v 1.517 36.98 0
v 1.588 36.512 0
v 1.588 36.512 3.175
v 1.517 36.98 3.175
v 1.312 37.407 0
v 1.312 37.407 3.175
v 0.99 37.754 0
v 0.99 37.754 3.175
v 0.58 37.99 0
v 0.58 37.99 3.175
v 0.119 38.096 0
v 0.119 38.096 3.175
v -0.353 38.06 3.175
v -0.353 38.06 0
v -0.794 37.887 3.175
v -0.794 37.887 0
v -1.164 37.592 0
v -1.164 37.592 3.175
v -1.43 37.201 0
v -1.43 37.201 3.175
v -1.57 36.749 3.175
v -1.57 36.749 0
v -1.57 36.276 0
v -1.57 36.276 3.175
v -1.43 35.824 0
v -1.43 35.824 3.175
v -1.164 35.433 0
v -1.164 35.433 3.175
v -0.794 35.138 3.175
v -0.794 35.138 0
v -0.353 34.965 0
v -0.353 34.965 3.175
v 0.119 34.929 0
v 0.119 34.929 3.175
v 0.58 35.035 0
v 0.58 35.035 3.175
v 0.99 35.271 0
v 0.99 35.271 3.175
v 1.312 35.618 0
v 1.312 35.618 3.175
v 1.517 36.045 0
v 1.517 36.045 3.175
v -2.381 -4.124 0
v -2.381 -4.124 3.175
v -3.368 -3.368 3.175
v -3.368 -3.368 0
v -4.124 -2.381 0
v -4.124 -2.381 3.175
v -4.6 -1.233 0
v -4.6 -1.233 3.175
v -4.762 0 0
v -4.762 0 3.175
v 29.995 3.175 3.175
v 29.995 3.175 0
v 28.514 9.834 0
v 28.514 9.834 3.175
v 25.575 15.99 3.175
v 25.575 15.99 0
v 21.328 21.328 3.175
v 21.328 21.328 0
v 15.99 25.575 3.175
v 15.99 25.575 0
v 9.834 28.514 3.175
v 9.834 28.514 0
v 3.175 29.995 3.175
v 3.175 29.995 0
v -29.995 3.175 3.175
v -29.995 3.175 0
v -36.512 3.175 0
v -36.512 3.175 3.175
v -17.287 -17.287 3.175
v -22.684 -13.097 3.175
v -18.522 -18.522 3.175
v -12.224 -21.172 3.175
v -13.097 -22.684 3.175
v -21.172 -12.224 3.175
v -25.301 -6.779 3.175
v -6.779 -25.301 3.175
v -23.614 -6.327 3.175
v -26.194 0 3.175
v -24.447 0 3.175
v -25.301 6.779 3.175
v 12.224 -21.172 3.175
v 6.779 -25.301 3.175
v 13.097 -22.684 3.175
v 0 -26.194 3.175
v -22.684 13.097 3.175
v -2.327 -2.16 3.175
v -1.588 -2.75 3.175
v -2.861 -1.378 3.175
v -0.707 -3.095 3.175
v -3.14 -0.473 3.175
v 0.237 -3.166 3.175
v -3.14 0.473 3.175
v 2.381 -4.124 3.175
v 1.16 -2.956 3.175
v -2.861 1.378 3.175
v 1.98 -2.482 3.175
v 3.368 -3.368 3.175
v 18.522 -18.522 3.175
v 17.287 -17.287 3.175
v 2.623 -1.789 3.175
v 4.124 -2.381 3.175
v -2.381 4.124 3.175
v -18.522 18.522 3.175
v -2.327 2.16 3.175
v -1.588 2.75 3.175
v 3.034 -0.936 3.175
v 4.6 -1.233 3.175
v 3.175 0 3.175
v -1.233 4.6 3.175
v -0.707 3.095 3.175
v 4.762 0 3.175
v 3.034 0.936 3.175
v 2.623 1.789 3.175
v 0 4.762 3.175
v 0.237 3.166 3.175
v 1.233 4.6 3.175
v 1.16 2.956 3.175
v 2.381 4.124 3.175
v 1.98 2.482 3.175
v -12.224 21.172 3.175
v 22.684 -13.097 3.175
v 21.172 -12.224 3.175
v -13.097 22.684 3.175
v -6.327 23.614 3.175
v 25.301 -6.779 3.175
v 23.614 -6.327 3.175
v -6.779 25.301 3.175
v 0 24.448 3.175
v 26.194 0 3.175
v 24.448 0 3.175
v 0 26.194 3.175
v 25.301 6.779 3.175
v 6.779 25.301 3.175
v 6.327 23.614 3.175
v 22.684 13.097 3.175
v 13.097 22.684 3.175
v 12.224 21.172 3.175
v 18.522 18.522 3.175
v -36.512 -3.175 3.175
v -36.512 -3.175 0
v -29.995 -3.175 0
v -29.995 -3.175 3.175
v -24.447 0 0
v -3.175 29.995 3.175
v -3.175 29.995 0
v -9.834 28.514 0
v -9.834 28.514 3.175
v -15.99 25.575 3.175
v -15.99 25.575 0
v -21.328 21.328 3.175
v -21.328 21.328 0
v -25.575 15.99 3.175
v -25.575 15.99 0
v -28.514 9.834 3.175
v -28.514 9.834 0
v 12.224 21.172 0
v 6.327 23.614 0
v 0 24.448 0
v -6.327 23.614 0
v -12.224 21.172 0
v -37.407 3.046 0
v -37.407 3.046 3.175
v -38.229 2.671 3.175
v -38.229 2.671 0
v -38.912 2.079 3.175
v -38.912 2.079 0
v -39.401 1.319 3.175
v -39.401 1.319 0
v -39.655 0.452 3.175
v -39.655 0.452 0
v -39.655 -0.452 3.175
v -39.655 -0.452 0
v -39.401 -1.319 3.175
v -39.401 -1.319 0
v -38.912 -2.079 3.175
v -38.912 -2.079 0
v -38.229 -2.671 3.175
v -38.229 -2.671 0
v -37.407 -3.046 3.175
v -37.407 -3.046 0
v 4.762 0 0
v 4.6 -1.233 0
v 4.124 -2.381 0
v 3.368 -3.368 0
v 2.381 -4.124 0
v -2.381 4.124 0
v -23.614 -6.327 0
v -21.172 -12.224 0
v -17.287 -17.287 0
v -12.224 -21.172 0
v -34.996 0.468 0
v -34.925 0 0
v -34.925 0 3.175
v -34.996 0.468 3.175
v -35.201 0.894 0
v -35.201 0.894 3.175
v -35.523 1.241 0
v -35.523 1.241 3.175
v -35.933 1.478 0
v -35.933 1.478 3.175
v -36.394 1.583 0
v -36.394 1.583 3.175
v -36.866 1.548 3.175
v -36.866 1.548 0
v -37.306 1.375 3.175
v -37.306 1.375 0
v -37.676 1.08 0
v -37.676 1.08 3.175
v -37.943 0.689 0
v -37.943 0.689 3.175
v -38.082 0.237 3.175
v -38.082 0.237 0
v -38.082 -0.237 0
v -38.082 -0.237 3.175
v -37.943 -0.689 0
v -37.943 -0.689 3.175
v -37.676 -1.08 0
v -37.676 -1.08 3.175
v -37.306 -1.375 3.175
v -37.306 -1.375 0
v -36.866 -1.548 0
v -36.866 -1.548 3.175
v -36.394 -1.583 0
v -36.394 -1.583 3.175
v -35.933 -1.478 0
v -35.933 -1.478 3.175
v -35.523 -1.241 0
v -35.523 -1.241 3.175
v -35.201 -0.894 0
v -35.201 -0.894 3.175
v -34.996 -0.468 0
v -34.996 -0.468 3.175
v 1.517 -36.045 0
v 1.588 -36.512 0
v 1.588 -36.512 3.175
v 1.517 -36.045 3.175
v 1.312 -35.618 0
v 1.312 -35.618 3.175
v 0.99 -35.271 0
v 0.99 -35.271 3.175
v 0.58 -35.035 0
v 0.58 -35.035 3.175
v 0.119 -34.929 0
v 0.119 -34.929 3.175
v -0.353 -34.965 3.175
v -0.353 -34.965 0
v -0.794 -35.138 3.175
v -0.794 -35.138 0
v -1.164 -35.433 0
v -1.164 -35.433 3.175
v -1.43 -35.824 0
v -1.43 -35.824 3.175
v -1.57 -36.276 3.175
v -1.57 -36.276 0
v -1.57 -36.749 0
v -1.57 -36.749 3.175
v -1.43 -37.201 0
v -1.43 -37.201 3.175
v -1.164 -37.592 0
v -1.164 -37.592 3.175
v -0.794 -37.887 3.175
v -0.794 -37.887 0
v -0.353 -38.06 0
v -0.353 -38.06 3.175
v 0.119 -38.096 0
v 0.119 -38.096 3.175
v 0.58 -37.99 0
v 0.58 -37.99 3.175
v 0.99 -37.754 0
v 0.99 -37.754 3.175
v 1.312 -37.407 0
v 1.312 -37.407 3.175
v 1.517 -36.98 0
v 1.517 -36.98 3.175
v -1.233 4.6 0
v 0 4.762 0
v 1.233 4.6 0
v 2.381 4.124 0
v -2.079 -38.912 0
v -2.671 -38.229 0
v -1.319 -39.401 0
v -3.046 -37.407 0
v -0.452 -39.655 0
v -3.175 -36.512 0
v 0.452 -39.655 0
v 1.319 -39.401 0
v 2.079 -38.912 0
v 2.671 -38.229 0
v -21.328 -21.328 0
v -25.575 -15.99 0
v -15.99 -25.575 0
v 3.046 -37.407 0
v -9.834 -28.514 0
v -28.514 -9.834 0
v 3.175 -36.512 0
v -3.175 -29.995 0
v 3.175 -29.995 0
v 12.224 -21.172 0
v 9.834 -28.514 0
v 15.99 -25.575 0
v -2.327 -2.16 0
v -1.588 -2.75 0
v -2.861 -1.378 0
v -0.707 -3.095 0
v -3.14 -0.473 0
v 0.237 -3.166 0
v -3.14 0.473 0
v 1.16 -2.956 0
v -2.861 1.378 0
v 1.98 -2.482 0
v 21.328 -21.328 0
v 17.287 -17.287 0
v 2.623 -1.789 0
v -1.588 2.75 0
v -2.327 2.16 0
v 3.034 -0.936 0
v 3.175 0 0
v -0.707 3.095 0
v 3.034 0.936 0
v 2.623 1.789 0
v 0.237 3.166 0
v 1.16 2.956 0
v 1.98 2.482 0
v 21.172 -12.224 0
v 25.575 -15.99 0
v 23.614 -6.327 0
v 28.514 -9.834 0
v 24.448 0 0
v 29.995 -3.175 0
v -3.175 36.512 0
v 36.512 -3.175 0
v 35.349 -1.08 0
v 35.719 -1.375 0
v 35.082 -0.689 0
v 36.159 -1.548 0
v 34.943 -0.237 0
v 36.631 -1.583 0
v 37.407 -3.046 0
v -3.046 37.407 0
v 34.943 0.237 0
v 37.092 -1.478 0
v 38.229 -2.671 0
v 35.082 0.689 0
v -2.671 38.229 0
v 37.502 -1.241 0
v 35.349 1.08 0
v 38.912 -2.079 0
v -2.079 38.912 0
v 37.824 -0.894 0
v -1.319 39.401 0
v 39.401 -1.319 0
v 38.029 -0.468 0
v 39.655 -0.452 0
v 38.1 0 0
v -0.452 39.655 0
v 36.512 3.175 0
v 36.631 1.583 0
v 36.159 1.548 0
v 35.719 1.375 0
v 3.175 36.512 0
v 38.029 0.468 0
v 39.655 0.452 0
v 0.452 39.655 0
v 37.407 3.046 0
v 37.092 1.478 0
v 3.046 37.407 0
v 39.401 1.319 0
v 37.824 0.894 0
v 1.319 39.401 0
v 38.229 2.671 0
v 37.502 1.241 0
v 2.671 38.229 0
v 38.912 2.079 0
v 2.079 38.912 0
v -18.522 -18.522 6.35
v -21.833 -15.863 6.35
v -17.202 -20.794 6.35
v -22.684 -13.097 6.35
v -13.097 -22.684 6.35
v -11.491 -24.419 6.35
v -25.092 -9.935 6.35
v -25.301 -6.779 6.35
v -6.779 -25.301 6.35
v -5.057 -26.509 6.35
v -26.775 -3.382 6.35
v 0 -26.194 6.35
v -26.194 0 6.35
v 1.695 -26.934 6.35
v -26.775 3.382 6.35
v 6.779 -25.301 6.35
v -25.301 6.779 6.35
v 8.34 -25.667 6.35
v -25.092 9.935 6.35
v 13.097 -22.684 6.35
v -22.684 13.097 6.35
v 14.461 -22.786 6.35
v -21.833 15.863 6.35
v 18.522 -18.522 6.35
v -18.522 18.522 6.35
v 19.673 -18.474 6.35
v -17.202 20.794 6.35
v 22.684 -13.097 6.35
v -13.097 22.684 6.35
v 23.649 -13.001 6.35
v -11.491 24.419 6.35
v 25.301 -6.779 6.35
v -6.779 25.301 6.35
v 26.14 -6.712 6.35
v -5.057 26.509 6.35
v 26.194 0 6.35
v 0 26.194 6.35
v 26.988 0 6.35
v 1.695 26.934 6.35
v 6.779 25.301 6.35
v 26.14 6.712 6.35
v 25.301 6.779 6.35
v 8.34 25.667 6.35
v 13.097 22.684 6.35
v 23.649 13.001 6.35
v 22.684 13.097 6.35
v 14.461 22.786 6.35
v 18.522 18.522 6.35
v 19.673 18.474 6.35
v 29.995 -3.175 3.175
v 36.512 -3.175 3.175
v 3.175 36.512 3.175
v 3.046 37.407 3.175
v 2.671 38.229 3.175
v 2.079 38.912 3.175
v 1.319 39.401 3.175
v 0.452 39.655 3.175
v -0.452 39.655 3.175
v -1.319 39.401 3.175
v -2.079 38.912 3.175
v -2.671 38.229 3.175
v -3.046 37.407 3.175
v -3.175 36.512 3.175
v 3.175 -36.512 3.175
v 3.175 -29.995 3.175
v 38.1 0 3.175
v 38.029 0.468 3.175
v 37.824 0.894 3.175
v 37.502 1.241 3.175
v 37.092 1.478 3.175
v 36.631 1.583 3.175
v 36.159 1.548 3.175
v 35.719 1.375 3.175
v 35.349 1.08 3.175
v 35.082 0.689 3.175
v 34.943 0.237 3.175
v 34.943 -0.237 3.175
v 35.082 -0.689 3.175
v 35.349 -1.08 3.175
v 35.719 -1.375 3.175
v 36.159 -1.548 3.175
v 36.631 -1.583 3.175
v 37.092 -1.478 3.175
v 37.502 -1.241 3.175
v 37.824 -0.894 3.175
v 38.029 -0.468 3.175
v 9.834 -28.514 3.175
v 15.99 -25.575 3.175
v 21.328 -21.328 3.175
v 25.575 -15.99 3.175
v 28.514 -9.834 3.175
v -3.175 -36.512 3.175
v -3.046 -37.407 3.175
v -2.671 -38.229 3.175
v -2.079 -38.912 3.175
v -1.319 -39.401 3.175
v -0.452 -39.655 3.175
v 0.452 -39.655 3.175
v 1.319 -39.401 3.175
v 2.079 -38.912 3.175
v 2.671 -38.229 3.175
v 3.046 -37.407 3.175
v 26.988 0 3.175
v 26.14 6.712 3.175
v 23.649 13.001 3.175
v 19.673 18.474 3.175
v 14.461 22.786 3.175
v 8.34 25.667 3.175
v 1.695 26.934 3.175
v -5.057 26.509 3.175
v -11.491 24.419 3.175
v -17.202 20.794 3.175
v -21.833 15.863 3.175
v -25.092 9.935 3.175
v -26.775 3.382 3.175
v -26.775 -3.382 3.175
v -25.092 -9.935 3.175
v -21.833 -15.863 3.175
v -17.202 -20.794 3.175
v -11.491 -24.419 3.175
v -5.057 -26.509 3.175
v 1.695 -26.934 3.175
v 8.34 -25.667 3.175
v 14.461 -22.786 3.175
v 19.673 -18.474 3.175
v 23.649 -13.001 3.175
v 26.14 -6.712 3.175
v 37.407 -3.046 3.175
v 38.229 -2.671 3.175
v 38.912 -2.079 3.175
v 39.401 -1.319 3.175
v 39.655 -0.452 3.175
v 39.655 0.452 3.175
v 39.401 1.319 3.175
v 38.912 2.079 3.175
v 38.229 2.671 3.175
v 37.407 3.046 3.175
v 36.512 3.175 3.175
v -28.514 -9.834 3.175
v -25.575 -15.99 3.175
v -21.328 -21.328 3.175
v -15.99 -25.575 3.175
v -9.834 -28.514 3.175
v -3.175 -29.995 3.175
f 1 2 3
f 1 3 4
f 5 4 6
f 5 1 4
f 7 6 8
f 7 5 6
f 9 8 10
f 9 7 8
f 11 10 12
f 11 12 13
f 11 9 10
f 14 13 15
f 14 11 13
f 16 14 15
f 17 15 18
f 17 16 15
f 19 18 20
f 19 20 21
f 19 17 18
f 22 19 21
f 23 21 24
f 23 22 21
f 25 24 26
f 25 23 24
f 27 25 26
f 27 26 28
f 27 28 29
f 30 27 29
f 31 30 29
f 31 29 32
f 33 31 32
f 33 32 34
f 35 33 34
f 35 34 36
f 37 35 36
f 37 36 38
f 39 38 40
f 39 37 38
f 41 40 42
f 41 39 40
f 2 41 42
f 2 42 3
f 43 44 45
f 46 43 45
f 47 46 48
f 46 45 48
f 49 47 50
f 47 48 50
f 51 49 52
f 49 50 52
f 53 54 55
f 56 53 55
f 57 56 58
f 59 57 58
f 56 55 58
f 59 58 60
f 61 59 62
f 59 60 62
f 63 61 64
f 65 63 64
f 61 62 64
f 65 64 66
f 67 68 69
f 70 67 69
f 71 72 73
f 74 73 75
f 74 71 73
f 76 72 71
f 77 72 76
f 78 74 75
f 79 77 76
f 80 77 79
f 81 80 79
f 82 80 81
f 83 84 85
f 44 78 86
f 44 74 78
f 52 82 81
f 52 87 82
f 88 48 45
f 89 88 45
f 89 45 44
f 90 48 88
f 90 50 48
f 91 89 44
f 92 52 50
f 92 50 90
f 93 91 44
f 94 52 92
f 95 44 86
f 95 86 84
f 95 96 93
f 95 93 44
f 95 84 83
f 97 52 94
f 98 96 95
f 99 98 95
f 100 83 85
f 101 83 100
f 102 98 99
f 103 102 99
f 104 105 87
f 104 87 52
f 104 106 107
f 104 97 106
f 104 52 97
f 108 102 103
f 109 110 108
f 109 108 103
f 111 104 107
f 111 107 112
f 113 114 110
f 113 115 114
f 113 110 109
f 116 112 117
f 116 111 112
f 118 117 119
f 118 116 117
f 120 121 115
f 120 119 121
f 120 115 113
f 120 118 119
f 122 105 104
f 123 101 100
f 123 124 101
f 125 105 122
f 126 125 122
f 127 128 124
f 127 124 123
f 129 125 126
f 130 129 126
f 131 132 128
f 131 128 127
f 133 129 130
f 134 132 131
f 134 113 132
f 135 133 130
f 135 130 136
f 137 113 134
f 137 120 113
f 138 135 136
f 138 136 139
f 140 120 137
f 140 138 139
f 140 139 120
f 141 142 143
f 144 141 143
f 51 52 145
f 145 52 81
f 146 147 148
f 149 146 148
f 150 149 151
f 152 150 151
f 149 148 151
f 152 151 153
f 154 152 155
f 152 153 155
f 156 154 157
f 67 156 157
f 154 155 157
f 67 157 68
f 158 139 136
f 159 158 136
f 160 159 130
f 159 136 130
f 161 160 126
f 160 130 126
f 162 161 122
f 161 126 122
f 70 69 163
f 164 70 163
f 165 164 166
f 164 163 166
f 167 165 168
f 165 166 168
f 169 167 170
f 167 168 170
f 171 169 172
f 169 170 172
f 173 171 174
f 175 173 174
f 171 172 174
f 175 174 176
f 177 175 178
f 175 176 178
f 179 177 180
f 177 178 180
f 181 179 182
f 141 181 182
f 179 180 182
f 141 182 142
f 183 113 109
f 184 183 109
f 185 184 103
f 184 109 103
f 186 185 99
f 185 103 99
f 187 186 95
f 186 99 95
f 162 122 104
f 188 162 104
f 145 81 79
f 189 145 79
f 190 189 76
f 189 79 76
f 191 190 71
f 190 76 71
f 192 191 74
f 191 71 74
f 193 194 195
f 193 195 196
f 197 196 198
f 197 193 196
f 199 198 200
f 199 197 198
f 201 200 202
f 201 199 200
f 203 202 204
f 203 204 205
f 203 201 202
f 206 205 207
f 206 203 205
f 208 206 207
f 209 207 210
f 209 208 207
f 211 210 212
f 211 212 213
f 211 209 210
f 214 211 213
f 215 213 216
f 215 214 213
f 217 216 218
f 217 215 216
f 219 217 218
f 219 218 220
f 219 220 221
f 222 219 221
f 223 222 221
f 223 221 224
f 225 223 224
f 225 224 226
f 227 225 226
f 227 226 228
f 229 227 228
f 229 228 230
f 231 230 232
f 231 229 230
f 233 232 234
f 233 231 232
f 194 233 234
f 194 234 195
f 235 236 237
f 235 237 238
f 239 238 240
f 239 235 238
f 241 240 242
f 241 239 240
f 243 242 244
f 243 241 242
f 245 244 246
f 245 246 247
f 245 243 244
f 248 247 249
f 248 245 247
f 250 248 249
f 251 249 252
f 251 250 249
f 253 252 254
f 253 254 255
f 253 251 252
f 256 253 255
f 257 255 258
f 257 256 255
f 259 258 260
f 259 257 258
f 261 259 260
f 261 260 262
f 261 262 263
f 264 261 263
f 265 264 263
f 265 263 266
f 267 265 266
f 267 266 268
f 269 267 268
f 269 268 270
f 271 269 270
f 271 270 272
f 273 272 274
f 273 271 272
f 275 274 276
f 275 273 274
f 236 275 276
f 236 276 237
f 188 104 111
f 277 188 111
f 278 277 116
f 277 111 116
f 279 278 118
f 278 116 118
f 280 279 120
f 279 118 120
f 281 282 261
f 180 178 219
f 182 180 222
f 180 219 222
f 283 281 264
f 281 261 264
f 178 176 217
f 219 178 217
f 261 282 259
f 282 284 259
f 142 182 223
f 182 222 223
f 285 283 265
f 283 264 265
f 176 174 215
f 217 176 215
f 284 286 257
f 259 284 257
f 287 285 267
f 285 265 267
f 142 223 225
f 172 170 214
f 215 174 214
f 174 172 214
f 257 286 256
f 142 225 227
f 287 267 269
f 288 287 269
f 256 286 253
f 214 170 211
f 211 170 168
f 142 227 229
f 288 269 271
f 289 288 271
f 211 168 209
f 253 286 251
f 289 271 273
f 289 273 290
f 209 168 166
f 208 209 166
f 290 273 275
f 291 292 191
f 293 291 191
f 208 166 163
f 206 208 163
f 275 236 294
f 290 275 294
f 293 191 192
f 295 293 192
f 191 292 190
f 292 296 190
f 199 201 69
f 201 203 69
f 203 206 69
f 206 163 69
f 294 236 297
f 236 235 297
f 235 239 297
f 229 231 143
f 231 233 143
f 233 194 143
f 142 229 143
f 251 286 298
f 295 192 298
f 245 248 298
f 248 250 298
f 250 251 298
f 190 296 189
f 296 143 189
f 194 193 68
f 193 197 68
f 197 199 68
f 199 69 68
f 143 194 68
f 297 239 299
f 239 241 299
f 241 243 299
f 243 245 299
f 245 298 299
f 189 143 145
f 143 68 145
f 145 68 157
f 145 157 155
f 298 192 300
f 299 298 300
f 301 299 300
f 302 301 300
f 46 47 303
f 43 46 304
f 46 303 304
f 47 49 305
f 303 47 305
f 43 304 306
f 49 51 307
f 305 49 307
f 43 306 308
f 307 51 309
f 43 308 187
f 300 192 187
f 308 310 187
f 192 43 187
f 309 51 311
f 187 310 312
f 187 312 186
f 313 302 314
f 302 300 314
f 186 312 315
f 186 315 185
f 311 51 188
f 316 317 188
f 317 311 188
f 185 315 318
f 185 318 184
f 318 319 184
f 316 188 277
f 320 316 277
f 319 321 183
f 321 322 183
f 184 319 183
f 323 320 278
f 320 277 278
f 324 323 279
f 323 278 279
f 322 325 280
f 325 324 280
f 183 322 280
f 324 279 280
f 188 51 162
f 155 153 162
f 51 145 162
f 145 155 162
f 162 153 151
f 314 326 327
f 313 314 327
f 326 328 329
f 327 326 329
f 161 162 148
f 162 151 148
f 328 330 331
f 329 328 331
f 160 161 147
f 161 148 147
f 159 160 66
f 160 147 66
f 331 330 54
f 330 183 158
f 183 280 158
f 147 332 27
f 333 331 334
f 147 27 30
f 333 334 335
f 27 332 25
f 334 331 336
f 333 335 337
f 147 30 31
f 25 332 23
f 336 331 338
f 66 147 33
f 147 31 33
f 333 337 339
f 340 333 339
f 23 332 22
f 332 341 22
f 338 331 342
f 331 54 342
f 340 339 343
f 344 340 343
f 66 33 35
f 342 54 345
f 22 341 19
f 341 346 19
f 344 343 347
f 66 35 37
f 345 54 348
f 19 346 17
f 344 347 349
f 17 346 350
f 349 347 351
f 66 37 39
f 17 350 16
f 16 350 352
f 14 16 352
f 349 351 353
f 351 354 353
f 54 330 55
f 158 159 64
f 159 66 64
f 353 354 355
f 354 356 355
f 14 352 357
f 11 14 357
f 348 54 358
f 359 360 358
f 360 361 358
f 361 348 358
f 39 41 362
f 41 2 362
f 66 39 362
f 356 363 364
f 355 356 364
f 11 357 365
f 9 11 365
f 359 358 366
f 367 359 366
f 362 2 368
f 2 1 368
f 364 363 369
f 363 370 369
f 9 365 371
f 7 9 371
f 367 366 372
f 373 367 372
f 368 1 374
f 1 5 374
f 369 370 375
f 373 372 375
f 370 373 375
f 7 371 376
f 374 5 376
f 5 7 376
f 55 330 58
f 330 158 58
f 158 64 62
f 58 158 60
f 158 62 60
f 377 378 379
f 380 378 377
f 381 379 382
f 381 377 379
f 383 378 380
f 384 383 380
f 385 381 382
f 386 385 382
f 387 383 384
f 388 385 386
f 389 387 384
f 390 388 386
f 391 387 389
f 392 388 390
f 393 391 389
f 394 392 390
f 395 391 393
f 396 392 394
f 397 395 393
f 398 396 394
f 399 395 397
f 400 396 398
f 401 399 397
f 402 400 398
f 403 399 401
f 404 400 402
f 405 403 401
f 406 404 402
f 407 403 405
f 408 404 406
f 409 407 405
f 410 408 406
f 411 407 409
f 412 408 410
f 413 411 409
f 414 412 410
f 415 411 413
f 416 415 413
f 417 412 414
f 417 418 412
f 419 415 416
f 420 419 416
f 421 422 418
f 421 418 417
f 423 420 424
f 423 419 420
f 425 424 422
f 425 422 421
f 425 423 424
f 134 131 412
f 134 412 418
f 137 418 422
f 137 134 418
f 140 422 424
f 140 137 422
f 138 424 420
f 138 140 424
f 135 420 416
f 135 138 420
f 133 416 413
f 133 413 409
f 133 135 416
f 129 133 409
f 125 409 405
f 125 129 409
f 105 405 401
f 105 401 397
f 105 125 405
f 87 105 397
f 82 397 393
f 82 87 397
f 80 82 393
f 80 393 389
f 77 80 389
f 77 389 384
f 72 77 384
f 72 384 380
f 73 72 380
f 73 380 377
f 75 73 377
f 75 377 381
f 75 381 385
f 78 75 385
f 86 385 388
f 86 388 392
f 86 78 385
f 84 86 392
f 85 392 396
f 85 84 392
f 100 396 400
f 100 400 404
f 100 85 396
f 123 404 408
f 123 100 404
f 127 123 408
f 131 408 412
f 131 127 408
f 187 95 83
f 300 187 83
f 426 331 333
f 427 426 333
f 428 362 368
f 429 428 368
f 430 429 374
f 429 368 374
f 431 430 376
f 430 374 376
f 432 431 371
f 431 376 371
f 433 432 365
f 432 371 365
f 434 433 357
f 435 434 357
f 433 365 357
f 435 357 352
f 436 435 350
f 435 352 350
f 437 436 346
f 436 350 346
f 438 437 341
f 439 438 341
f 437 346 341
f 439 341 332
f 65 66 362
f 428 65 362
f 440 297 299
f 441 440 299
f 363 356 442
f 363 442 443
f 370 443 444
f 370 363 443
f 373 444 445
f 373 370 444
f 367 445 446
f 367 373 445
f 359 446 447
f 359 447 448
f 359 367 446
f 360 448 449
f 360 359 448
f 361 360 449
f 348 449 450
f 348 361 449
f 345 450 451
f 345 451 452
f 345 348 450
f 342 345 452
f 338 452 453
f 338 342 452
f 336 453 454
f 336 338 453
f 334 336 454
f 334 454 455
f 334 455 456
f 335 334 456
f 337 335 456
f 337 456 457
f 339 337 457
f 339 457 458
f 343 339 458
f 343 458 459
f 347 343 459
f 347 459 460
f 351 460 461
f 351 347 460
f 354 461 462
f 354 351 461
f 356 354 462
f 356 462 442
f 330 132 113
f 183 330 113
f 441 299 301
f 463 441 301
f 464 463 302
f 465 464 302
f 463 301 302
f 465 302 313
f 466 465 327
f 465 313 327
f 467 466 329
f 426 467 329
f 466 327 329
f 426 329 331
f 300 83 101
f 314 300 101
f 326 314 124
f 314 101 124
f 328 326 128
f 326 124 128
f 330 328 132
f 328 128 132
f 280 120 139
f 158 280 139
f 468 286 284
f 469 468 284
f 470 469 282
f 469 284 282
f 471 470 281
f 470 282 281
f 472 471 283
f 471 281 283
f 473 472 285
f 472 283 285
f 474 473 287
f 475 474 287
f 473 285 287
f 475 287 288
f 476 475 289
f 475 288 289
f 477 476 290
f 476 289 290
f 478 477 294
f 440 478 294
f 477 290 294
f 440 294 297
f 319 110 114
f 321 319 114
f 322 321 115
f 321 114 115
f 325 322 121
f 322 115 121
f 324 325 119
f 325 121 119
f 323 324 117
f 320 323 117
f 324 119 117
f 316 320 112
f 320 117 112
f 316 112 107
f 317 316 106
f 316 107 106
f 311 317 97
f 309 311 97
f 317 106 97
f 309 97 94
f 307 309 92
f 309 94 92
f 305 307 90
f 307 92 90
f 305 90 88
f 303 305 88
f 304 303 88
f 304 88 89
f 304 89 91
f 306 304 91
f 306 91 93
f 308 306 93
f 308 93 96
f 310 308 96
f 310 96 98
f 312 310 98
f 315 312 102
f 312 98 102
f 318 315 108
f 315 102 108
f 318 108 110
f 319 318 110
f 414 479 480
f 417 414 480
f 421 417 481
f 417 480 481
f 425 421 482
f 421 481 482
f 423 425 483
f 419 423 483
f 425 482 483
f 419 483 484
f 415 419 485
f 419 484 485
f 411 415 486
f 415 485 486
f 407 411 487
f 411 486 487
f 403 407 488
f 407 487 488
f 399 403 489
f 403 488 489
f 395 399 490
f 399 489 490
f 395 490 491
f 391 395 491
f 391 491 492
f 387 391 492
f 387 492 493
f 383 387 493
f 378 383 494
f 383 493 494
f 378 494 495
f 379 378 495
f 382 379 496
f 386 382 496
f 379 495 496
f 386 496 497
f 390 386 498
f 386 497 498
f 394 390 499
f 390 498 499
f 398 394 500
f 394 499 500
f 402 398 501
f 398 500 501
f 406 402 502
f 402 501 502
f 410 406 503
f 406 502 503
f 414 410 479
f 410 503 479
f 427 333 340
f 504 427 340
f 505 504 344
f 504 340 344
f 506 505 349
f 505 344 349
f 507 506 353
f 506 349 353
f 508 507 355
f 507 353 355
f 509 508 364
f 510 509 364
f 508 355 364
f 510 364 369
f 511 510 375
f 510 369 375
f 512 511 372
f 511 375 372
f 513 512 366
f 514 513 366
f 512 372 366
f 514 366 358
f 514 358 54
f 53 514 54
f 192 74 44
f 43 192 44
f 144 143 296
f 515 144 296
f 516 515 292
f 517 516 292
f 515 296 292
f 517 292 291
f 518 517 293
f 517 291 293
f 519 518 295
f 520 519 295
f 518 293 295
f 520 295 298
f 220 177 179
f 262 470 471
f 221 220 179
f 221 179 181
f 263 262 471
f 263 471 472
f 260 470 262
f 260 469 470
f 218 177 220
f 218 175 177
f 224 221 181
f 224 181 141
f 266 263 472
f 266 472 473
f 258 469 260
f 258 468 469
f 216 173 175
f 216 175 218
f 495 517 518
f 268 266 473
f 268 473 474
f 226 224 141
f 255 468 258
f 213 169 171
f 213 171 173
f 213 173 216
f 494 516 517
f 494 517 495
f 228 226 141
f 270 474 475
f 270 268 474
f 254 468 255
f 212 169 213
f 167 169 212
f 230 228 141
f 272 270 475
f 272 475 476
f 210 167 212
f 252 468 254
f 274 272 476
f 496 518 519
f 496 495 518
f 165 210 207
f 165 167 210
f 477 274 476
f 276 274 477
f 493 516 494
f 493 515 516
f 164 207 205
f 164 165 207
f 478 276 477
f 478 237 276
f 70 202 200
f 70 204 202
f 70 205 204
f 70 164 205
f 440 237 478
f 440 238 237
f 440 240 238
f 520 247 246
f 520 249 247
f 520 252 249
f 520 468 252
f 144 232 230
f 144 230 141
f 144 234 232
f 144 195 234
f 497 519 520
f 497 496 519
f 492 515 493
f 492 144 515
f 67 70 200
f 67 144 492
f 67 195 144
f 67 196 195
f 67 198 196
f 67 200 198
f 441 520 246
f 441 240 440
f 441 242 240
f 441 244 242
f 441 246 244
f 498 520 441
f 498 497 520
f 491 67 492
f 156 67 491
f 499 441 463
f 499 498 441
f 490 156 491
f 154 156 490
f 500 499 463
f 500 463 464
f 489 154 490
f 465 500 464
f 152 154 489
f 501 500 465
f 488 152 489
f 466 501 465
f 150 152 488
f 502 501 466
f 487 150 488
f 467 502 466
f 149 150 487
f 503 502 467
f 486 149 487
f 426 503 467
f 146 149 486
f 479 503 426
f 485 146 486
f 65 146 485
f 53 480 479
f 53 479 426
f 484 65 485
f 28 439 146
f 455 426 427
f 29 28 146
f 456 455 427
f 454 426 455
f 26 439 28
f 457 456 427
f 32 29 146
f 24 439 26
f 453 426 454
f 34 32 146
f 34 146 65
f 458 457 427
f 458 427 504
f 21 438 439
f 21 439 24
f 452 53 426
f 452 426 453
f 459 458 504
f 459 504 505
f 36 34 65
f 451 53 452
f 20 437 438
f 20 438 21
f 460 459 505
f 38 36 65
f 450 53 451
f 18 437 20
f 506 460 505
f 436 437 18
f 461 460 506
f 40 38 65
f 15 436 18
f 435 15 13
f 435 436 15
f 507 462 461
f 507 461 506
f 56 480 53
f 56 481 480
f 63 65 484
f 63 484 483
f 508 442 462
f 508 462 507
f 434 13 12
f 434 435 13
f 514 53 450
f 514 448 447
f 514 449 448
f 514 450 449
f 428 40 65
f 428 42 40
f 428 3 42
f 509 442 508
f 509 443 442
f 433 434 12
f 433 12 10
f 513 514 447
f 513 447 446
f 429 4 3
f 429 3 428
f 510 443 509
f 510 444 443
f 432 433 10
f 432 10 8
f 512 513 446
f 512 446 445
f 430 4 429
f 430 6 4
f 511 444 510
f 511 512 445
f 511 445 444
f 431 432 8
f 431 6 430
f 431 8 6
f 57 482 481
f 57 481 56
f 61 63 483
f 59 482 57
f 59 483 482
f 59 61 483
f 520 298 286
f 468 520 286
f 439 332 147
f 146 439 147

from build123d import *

# Parameters (mm, degrees)
F0_R     = 1.5875
F1_DEPTH = 3.175
F2_R     = 26.9875
F2_R_2   = 26.19375
F3_DEPTH = 3.175
F4_R     = 3.175
F5_DEPTH = 3.175


with BuildPart() as f1:
    # F0 (on Top) → F1 (new body)
    with BuildSketch(Plane.XY):
        with BuildLine():
            Line((36.5125, 3.175), (29.994929, 3.175))
            ThreePointArc((29.994929, 3.175), (21.328108, 21.328108), (3.175, 29.994929))
            Line((3.175, 29.994929), (3.175, 36.5125))
            ThreePointArc((3.175, 36.5125), (0, 39.6875), (-3.175, 36.5125))
            Line((-3.175, 36.5125), (-3.175, 29.994929))
            ThreePointArc((-3.175, 29.994929), (-21.328108, 21.328108), (-29.994929, 3.175))
            Line((-29.994929, 3.175), (-30.1625, 3.175))
            Line((-30.1625, 3.175), (-36.5125, 3.175))
            ThreePointArc((-36.5125, 3.175), (-39.6875, 0), (-36.5125, -3.175))
            Line((-36.5125, -3.175), (-30.1625, -3.175))
            Line((-30.1625, -3.175), (-29.994929, -3.175))
            ThreePointArc((-29.994929, -3.175), (-21.328108, -21.328108), (-3.175, -29.994929))
            Line((-3.175, -29.994929), (-3.175, -36.5125))
            ThreePointArc((-3.175, -36.5125), (0, -39.6875), (3.175, -36.5125))
            Line((3.175, -36.5125), (3.175, -29.994929))
            ThreePointArc((3.175, -29.994929), (21.328108, -21.328108), (29.994929, -3.175))
            Line((29.994929, -3.175), (36.5125, -3.175))
            ThreePointArc((36.5125, -3.175), (39.6875, 0), (36.5125, 3.175))
        make_face()
        with Locations((0, -36.5125)):
            Circle(F0_R, mode=Mode.SUBTRACT)
        with Locations((-36.5125, 0)):
            Circle(F0_R, mode=Mode.SUBTRACT)
        with Locations((36.5125, 0)):
            Circle(F0_R, mode=Mode.SUBTRACT)
        with Locations((0, 36.5125)):
            Circle(F0_R, mode=Mode.SUBTRACT)
    extrude(amount=F1_DEPTH)

    # F2 (on face) → F3 (join)
    with BuildSketch(Plane.XY.offset(3.175)):
        Circle(F2_R)
        Circle(F2_R_2, mode=Mode.SUBTRACT)
    extrude(amount=F3_DEPTH)

    # F4 (on face) → F5 (cut)
    with BuildSketch(Plane.XY.offset(3.175)):
        with BuildLine():
            ThreePointArc((-2.38125, 4.124446), (0, 4.7625), (2.38125, 4.124446))
            Line((2.38125, 4.124446), (12.22375, 21.172156))
            ThreePointArc((12.22375, 21.172156), (0, 24.4475), (-12.22375, 21.172156))
            Line((-12.22375, 21.172156), (-2.38125, 4.124446))
        make_face()
        Circle(F4_R)
        with BuildLine():
            ThreePointArc((4.7625, 0), (4.124446, -2.38125), (2.38125, -4.124446))
            Line((2.38125, -4.124446), (12.22375, -21.172156))
            ThreePointArc((12.22375, -21.172156), (21.172156, -12.22375), (24.4475, 0))
            Line((24.4475, 0), (4.7625, 0))
        make_face()
        with BuildLine():
            Line((-4.7625, 0), (-24.4475, 0))
            ThreePointArc((-24.4475, 0), (-21.172156, -12.22375), (-12.22375, -21.172156))
            Line((-12.22375, -21.172156), (-2.38125, -4.124446))
            ThreePointArc((-2.38125, -4.124446), (-4.124446, -2.38125), (-4.7625, 0))
        make_face()
    extrude(amount=-F5_DEPTH, mode=Mode.SUBTRACT)


solid = f1.part
